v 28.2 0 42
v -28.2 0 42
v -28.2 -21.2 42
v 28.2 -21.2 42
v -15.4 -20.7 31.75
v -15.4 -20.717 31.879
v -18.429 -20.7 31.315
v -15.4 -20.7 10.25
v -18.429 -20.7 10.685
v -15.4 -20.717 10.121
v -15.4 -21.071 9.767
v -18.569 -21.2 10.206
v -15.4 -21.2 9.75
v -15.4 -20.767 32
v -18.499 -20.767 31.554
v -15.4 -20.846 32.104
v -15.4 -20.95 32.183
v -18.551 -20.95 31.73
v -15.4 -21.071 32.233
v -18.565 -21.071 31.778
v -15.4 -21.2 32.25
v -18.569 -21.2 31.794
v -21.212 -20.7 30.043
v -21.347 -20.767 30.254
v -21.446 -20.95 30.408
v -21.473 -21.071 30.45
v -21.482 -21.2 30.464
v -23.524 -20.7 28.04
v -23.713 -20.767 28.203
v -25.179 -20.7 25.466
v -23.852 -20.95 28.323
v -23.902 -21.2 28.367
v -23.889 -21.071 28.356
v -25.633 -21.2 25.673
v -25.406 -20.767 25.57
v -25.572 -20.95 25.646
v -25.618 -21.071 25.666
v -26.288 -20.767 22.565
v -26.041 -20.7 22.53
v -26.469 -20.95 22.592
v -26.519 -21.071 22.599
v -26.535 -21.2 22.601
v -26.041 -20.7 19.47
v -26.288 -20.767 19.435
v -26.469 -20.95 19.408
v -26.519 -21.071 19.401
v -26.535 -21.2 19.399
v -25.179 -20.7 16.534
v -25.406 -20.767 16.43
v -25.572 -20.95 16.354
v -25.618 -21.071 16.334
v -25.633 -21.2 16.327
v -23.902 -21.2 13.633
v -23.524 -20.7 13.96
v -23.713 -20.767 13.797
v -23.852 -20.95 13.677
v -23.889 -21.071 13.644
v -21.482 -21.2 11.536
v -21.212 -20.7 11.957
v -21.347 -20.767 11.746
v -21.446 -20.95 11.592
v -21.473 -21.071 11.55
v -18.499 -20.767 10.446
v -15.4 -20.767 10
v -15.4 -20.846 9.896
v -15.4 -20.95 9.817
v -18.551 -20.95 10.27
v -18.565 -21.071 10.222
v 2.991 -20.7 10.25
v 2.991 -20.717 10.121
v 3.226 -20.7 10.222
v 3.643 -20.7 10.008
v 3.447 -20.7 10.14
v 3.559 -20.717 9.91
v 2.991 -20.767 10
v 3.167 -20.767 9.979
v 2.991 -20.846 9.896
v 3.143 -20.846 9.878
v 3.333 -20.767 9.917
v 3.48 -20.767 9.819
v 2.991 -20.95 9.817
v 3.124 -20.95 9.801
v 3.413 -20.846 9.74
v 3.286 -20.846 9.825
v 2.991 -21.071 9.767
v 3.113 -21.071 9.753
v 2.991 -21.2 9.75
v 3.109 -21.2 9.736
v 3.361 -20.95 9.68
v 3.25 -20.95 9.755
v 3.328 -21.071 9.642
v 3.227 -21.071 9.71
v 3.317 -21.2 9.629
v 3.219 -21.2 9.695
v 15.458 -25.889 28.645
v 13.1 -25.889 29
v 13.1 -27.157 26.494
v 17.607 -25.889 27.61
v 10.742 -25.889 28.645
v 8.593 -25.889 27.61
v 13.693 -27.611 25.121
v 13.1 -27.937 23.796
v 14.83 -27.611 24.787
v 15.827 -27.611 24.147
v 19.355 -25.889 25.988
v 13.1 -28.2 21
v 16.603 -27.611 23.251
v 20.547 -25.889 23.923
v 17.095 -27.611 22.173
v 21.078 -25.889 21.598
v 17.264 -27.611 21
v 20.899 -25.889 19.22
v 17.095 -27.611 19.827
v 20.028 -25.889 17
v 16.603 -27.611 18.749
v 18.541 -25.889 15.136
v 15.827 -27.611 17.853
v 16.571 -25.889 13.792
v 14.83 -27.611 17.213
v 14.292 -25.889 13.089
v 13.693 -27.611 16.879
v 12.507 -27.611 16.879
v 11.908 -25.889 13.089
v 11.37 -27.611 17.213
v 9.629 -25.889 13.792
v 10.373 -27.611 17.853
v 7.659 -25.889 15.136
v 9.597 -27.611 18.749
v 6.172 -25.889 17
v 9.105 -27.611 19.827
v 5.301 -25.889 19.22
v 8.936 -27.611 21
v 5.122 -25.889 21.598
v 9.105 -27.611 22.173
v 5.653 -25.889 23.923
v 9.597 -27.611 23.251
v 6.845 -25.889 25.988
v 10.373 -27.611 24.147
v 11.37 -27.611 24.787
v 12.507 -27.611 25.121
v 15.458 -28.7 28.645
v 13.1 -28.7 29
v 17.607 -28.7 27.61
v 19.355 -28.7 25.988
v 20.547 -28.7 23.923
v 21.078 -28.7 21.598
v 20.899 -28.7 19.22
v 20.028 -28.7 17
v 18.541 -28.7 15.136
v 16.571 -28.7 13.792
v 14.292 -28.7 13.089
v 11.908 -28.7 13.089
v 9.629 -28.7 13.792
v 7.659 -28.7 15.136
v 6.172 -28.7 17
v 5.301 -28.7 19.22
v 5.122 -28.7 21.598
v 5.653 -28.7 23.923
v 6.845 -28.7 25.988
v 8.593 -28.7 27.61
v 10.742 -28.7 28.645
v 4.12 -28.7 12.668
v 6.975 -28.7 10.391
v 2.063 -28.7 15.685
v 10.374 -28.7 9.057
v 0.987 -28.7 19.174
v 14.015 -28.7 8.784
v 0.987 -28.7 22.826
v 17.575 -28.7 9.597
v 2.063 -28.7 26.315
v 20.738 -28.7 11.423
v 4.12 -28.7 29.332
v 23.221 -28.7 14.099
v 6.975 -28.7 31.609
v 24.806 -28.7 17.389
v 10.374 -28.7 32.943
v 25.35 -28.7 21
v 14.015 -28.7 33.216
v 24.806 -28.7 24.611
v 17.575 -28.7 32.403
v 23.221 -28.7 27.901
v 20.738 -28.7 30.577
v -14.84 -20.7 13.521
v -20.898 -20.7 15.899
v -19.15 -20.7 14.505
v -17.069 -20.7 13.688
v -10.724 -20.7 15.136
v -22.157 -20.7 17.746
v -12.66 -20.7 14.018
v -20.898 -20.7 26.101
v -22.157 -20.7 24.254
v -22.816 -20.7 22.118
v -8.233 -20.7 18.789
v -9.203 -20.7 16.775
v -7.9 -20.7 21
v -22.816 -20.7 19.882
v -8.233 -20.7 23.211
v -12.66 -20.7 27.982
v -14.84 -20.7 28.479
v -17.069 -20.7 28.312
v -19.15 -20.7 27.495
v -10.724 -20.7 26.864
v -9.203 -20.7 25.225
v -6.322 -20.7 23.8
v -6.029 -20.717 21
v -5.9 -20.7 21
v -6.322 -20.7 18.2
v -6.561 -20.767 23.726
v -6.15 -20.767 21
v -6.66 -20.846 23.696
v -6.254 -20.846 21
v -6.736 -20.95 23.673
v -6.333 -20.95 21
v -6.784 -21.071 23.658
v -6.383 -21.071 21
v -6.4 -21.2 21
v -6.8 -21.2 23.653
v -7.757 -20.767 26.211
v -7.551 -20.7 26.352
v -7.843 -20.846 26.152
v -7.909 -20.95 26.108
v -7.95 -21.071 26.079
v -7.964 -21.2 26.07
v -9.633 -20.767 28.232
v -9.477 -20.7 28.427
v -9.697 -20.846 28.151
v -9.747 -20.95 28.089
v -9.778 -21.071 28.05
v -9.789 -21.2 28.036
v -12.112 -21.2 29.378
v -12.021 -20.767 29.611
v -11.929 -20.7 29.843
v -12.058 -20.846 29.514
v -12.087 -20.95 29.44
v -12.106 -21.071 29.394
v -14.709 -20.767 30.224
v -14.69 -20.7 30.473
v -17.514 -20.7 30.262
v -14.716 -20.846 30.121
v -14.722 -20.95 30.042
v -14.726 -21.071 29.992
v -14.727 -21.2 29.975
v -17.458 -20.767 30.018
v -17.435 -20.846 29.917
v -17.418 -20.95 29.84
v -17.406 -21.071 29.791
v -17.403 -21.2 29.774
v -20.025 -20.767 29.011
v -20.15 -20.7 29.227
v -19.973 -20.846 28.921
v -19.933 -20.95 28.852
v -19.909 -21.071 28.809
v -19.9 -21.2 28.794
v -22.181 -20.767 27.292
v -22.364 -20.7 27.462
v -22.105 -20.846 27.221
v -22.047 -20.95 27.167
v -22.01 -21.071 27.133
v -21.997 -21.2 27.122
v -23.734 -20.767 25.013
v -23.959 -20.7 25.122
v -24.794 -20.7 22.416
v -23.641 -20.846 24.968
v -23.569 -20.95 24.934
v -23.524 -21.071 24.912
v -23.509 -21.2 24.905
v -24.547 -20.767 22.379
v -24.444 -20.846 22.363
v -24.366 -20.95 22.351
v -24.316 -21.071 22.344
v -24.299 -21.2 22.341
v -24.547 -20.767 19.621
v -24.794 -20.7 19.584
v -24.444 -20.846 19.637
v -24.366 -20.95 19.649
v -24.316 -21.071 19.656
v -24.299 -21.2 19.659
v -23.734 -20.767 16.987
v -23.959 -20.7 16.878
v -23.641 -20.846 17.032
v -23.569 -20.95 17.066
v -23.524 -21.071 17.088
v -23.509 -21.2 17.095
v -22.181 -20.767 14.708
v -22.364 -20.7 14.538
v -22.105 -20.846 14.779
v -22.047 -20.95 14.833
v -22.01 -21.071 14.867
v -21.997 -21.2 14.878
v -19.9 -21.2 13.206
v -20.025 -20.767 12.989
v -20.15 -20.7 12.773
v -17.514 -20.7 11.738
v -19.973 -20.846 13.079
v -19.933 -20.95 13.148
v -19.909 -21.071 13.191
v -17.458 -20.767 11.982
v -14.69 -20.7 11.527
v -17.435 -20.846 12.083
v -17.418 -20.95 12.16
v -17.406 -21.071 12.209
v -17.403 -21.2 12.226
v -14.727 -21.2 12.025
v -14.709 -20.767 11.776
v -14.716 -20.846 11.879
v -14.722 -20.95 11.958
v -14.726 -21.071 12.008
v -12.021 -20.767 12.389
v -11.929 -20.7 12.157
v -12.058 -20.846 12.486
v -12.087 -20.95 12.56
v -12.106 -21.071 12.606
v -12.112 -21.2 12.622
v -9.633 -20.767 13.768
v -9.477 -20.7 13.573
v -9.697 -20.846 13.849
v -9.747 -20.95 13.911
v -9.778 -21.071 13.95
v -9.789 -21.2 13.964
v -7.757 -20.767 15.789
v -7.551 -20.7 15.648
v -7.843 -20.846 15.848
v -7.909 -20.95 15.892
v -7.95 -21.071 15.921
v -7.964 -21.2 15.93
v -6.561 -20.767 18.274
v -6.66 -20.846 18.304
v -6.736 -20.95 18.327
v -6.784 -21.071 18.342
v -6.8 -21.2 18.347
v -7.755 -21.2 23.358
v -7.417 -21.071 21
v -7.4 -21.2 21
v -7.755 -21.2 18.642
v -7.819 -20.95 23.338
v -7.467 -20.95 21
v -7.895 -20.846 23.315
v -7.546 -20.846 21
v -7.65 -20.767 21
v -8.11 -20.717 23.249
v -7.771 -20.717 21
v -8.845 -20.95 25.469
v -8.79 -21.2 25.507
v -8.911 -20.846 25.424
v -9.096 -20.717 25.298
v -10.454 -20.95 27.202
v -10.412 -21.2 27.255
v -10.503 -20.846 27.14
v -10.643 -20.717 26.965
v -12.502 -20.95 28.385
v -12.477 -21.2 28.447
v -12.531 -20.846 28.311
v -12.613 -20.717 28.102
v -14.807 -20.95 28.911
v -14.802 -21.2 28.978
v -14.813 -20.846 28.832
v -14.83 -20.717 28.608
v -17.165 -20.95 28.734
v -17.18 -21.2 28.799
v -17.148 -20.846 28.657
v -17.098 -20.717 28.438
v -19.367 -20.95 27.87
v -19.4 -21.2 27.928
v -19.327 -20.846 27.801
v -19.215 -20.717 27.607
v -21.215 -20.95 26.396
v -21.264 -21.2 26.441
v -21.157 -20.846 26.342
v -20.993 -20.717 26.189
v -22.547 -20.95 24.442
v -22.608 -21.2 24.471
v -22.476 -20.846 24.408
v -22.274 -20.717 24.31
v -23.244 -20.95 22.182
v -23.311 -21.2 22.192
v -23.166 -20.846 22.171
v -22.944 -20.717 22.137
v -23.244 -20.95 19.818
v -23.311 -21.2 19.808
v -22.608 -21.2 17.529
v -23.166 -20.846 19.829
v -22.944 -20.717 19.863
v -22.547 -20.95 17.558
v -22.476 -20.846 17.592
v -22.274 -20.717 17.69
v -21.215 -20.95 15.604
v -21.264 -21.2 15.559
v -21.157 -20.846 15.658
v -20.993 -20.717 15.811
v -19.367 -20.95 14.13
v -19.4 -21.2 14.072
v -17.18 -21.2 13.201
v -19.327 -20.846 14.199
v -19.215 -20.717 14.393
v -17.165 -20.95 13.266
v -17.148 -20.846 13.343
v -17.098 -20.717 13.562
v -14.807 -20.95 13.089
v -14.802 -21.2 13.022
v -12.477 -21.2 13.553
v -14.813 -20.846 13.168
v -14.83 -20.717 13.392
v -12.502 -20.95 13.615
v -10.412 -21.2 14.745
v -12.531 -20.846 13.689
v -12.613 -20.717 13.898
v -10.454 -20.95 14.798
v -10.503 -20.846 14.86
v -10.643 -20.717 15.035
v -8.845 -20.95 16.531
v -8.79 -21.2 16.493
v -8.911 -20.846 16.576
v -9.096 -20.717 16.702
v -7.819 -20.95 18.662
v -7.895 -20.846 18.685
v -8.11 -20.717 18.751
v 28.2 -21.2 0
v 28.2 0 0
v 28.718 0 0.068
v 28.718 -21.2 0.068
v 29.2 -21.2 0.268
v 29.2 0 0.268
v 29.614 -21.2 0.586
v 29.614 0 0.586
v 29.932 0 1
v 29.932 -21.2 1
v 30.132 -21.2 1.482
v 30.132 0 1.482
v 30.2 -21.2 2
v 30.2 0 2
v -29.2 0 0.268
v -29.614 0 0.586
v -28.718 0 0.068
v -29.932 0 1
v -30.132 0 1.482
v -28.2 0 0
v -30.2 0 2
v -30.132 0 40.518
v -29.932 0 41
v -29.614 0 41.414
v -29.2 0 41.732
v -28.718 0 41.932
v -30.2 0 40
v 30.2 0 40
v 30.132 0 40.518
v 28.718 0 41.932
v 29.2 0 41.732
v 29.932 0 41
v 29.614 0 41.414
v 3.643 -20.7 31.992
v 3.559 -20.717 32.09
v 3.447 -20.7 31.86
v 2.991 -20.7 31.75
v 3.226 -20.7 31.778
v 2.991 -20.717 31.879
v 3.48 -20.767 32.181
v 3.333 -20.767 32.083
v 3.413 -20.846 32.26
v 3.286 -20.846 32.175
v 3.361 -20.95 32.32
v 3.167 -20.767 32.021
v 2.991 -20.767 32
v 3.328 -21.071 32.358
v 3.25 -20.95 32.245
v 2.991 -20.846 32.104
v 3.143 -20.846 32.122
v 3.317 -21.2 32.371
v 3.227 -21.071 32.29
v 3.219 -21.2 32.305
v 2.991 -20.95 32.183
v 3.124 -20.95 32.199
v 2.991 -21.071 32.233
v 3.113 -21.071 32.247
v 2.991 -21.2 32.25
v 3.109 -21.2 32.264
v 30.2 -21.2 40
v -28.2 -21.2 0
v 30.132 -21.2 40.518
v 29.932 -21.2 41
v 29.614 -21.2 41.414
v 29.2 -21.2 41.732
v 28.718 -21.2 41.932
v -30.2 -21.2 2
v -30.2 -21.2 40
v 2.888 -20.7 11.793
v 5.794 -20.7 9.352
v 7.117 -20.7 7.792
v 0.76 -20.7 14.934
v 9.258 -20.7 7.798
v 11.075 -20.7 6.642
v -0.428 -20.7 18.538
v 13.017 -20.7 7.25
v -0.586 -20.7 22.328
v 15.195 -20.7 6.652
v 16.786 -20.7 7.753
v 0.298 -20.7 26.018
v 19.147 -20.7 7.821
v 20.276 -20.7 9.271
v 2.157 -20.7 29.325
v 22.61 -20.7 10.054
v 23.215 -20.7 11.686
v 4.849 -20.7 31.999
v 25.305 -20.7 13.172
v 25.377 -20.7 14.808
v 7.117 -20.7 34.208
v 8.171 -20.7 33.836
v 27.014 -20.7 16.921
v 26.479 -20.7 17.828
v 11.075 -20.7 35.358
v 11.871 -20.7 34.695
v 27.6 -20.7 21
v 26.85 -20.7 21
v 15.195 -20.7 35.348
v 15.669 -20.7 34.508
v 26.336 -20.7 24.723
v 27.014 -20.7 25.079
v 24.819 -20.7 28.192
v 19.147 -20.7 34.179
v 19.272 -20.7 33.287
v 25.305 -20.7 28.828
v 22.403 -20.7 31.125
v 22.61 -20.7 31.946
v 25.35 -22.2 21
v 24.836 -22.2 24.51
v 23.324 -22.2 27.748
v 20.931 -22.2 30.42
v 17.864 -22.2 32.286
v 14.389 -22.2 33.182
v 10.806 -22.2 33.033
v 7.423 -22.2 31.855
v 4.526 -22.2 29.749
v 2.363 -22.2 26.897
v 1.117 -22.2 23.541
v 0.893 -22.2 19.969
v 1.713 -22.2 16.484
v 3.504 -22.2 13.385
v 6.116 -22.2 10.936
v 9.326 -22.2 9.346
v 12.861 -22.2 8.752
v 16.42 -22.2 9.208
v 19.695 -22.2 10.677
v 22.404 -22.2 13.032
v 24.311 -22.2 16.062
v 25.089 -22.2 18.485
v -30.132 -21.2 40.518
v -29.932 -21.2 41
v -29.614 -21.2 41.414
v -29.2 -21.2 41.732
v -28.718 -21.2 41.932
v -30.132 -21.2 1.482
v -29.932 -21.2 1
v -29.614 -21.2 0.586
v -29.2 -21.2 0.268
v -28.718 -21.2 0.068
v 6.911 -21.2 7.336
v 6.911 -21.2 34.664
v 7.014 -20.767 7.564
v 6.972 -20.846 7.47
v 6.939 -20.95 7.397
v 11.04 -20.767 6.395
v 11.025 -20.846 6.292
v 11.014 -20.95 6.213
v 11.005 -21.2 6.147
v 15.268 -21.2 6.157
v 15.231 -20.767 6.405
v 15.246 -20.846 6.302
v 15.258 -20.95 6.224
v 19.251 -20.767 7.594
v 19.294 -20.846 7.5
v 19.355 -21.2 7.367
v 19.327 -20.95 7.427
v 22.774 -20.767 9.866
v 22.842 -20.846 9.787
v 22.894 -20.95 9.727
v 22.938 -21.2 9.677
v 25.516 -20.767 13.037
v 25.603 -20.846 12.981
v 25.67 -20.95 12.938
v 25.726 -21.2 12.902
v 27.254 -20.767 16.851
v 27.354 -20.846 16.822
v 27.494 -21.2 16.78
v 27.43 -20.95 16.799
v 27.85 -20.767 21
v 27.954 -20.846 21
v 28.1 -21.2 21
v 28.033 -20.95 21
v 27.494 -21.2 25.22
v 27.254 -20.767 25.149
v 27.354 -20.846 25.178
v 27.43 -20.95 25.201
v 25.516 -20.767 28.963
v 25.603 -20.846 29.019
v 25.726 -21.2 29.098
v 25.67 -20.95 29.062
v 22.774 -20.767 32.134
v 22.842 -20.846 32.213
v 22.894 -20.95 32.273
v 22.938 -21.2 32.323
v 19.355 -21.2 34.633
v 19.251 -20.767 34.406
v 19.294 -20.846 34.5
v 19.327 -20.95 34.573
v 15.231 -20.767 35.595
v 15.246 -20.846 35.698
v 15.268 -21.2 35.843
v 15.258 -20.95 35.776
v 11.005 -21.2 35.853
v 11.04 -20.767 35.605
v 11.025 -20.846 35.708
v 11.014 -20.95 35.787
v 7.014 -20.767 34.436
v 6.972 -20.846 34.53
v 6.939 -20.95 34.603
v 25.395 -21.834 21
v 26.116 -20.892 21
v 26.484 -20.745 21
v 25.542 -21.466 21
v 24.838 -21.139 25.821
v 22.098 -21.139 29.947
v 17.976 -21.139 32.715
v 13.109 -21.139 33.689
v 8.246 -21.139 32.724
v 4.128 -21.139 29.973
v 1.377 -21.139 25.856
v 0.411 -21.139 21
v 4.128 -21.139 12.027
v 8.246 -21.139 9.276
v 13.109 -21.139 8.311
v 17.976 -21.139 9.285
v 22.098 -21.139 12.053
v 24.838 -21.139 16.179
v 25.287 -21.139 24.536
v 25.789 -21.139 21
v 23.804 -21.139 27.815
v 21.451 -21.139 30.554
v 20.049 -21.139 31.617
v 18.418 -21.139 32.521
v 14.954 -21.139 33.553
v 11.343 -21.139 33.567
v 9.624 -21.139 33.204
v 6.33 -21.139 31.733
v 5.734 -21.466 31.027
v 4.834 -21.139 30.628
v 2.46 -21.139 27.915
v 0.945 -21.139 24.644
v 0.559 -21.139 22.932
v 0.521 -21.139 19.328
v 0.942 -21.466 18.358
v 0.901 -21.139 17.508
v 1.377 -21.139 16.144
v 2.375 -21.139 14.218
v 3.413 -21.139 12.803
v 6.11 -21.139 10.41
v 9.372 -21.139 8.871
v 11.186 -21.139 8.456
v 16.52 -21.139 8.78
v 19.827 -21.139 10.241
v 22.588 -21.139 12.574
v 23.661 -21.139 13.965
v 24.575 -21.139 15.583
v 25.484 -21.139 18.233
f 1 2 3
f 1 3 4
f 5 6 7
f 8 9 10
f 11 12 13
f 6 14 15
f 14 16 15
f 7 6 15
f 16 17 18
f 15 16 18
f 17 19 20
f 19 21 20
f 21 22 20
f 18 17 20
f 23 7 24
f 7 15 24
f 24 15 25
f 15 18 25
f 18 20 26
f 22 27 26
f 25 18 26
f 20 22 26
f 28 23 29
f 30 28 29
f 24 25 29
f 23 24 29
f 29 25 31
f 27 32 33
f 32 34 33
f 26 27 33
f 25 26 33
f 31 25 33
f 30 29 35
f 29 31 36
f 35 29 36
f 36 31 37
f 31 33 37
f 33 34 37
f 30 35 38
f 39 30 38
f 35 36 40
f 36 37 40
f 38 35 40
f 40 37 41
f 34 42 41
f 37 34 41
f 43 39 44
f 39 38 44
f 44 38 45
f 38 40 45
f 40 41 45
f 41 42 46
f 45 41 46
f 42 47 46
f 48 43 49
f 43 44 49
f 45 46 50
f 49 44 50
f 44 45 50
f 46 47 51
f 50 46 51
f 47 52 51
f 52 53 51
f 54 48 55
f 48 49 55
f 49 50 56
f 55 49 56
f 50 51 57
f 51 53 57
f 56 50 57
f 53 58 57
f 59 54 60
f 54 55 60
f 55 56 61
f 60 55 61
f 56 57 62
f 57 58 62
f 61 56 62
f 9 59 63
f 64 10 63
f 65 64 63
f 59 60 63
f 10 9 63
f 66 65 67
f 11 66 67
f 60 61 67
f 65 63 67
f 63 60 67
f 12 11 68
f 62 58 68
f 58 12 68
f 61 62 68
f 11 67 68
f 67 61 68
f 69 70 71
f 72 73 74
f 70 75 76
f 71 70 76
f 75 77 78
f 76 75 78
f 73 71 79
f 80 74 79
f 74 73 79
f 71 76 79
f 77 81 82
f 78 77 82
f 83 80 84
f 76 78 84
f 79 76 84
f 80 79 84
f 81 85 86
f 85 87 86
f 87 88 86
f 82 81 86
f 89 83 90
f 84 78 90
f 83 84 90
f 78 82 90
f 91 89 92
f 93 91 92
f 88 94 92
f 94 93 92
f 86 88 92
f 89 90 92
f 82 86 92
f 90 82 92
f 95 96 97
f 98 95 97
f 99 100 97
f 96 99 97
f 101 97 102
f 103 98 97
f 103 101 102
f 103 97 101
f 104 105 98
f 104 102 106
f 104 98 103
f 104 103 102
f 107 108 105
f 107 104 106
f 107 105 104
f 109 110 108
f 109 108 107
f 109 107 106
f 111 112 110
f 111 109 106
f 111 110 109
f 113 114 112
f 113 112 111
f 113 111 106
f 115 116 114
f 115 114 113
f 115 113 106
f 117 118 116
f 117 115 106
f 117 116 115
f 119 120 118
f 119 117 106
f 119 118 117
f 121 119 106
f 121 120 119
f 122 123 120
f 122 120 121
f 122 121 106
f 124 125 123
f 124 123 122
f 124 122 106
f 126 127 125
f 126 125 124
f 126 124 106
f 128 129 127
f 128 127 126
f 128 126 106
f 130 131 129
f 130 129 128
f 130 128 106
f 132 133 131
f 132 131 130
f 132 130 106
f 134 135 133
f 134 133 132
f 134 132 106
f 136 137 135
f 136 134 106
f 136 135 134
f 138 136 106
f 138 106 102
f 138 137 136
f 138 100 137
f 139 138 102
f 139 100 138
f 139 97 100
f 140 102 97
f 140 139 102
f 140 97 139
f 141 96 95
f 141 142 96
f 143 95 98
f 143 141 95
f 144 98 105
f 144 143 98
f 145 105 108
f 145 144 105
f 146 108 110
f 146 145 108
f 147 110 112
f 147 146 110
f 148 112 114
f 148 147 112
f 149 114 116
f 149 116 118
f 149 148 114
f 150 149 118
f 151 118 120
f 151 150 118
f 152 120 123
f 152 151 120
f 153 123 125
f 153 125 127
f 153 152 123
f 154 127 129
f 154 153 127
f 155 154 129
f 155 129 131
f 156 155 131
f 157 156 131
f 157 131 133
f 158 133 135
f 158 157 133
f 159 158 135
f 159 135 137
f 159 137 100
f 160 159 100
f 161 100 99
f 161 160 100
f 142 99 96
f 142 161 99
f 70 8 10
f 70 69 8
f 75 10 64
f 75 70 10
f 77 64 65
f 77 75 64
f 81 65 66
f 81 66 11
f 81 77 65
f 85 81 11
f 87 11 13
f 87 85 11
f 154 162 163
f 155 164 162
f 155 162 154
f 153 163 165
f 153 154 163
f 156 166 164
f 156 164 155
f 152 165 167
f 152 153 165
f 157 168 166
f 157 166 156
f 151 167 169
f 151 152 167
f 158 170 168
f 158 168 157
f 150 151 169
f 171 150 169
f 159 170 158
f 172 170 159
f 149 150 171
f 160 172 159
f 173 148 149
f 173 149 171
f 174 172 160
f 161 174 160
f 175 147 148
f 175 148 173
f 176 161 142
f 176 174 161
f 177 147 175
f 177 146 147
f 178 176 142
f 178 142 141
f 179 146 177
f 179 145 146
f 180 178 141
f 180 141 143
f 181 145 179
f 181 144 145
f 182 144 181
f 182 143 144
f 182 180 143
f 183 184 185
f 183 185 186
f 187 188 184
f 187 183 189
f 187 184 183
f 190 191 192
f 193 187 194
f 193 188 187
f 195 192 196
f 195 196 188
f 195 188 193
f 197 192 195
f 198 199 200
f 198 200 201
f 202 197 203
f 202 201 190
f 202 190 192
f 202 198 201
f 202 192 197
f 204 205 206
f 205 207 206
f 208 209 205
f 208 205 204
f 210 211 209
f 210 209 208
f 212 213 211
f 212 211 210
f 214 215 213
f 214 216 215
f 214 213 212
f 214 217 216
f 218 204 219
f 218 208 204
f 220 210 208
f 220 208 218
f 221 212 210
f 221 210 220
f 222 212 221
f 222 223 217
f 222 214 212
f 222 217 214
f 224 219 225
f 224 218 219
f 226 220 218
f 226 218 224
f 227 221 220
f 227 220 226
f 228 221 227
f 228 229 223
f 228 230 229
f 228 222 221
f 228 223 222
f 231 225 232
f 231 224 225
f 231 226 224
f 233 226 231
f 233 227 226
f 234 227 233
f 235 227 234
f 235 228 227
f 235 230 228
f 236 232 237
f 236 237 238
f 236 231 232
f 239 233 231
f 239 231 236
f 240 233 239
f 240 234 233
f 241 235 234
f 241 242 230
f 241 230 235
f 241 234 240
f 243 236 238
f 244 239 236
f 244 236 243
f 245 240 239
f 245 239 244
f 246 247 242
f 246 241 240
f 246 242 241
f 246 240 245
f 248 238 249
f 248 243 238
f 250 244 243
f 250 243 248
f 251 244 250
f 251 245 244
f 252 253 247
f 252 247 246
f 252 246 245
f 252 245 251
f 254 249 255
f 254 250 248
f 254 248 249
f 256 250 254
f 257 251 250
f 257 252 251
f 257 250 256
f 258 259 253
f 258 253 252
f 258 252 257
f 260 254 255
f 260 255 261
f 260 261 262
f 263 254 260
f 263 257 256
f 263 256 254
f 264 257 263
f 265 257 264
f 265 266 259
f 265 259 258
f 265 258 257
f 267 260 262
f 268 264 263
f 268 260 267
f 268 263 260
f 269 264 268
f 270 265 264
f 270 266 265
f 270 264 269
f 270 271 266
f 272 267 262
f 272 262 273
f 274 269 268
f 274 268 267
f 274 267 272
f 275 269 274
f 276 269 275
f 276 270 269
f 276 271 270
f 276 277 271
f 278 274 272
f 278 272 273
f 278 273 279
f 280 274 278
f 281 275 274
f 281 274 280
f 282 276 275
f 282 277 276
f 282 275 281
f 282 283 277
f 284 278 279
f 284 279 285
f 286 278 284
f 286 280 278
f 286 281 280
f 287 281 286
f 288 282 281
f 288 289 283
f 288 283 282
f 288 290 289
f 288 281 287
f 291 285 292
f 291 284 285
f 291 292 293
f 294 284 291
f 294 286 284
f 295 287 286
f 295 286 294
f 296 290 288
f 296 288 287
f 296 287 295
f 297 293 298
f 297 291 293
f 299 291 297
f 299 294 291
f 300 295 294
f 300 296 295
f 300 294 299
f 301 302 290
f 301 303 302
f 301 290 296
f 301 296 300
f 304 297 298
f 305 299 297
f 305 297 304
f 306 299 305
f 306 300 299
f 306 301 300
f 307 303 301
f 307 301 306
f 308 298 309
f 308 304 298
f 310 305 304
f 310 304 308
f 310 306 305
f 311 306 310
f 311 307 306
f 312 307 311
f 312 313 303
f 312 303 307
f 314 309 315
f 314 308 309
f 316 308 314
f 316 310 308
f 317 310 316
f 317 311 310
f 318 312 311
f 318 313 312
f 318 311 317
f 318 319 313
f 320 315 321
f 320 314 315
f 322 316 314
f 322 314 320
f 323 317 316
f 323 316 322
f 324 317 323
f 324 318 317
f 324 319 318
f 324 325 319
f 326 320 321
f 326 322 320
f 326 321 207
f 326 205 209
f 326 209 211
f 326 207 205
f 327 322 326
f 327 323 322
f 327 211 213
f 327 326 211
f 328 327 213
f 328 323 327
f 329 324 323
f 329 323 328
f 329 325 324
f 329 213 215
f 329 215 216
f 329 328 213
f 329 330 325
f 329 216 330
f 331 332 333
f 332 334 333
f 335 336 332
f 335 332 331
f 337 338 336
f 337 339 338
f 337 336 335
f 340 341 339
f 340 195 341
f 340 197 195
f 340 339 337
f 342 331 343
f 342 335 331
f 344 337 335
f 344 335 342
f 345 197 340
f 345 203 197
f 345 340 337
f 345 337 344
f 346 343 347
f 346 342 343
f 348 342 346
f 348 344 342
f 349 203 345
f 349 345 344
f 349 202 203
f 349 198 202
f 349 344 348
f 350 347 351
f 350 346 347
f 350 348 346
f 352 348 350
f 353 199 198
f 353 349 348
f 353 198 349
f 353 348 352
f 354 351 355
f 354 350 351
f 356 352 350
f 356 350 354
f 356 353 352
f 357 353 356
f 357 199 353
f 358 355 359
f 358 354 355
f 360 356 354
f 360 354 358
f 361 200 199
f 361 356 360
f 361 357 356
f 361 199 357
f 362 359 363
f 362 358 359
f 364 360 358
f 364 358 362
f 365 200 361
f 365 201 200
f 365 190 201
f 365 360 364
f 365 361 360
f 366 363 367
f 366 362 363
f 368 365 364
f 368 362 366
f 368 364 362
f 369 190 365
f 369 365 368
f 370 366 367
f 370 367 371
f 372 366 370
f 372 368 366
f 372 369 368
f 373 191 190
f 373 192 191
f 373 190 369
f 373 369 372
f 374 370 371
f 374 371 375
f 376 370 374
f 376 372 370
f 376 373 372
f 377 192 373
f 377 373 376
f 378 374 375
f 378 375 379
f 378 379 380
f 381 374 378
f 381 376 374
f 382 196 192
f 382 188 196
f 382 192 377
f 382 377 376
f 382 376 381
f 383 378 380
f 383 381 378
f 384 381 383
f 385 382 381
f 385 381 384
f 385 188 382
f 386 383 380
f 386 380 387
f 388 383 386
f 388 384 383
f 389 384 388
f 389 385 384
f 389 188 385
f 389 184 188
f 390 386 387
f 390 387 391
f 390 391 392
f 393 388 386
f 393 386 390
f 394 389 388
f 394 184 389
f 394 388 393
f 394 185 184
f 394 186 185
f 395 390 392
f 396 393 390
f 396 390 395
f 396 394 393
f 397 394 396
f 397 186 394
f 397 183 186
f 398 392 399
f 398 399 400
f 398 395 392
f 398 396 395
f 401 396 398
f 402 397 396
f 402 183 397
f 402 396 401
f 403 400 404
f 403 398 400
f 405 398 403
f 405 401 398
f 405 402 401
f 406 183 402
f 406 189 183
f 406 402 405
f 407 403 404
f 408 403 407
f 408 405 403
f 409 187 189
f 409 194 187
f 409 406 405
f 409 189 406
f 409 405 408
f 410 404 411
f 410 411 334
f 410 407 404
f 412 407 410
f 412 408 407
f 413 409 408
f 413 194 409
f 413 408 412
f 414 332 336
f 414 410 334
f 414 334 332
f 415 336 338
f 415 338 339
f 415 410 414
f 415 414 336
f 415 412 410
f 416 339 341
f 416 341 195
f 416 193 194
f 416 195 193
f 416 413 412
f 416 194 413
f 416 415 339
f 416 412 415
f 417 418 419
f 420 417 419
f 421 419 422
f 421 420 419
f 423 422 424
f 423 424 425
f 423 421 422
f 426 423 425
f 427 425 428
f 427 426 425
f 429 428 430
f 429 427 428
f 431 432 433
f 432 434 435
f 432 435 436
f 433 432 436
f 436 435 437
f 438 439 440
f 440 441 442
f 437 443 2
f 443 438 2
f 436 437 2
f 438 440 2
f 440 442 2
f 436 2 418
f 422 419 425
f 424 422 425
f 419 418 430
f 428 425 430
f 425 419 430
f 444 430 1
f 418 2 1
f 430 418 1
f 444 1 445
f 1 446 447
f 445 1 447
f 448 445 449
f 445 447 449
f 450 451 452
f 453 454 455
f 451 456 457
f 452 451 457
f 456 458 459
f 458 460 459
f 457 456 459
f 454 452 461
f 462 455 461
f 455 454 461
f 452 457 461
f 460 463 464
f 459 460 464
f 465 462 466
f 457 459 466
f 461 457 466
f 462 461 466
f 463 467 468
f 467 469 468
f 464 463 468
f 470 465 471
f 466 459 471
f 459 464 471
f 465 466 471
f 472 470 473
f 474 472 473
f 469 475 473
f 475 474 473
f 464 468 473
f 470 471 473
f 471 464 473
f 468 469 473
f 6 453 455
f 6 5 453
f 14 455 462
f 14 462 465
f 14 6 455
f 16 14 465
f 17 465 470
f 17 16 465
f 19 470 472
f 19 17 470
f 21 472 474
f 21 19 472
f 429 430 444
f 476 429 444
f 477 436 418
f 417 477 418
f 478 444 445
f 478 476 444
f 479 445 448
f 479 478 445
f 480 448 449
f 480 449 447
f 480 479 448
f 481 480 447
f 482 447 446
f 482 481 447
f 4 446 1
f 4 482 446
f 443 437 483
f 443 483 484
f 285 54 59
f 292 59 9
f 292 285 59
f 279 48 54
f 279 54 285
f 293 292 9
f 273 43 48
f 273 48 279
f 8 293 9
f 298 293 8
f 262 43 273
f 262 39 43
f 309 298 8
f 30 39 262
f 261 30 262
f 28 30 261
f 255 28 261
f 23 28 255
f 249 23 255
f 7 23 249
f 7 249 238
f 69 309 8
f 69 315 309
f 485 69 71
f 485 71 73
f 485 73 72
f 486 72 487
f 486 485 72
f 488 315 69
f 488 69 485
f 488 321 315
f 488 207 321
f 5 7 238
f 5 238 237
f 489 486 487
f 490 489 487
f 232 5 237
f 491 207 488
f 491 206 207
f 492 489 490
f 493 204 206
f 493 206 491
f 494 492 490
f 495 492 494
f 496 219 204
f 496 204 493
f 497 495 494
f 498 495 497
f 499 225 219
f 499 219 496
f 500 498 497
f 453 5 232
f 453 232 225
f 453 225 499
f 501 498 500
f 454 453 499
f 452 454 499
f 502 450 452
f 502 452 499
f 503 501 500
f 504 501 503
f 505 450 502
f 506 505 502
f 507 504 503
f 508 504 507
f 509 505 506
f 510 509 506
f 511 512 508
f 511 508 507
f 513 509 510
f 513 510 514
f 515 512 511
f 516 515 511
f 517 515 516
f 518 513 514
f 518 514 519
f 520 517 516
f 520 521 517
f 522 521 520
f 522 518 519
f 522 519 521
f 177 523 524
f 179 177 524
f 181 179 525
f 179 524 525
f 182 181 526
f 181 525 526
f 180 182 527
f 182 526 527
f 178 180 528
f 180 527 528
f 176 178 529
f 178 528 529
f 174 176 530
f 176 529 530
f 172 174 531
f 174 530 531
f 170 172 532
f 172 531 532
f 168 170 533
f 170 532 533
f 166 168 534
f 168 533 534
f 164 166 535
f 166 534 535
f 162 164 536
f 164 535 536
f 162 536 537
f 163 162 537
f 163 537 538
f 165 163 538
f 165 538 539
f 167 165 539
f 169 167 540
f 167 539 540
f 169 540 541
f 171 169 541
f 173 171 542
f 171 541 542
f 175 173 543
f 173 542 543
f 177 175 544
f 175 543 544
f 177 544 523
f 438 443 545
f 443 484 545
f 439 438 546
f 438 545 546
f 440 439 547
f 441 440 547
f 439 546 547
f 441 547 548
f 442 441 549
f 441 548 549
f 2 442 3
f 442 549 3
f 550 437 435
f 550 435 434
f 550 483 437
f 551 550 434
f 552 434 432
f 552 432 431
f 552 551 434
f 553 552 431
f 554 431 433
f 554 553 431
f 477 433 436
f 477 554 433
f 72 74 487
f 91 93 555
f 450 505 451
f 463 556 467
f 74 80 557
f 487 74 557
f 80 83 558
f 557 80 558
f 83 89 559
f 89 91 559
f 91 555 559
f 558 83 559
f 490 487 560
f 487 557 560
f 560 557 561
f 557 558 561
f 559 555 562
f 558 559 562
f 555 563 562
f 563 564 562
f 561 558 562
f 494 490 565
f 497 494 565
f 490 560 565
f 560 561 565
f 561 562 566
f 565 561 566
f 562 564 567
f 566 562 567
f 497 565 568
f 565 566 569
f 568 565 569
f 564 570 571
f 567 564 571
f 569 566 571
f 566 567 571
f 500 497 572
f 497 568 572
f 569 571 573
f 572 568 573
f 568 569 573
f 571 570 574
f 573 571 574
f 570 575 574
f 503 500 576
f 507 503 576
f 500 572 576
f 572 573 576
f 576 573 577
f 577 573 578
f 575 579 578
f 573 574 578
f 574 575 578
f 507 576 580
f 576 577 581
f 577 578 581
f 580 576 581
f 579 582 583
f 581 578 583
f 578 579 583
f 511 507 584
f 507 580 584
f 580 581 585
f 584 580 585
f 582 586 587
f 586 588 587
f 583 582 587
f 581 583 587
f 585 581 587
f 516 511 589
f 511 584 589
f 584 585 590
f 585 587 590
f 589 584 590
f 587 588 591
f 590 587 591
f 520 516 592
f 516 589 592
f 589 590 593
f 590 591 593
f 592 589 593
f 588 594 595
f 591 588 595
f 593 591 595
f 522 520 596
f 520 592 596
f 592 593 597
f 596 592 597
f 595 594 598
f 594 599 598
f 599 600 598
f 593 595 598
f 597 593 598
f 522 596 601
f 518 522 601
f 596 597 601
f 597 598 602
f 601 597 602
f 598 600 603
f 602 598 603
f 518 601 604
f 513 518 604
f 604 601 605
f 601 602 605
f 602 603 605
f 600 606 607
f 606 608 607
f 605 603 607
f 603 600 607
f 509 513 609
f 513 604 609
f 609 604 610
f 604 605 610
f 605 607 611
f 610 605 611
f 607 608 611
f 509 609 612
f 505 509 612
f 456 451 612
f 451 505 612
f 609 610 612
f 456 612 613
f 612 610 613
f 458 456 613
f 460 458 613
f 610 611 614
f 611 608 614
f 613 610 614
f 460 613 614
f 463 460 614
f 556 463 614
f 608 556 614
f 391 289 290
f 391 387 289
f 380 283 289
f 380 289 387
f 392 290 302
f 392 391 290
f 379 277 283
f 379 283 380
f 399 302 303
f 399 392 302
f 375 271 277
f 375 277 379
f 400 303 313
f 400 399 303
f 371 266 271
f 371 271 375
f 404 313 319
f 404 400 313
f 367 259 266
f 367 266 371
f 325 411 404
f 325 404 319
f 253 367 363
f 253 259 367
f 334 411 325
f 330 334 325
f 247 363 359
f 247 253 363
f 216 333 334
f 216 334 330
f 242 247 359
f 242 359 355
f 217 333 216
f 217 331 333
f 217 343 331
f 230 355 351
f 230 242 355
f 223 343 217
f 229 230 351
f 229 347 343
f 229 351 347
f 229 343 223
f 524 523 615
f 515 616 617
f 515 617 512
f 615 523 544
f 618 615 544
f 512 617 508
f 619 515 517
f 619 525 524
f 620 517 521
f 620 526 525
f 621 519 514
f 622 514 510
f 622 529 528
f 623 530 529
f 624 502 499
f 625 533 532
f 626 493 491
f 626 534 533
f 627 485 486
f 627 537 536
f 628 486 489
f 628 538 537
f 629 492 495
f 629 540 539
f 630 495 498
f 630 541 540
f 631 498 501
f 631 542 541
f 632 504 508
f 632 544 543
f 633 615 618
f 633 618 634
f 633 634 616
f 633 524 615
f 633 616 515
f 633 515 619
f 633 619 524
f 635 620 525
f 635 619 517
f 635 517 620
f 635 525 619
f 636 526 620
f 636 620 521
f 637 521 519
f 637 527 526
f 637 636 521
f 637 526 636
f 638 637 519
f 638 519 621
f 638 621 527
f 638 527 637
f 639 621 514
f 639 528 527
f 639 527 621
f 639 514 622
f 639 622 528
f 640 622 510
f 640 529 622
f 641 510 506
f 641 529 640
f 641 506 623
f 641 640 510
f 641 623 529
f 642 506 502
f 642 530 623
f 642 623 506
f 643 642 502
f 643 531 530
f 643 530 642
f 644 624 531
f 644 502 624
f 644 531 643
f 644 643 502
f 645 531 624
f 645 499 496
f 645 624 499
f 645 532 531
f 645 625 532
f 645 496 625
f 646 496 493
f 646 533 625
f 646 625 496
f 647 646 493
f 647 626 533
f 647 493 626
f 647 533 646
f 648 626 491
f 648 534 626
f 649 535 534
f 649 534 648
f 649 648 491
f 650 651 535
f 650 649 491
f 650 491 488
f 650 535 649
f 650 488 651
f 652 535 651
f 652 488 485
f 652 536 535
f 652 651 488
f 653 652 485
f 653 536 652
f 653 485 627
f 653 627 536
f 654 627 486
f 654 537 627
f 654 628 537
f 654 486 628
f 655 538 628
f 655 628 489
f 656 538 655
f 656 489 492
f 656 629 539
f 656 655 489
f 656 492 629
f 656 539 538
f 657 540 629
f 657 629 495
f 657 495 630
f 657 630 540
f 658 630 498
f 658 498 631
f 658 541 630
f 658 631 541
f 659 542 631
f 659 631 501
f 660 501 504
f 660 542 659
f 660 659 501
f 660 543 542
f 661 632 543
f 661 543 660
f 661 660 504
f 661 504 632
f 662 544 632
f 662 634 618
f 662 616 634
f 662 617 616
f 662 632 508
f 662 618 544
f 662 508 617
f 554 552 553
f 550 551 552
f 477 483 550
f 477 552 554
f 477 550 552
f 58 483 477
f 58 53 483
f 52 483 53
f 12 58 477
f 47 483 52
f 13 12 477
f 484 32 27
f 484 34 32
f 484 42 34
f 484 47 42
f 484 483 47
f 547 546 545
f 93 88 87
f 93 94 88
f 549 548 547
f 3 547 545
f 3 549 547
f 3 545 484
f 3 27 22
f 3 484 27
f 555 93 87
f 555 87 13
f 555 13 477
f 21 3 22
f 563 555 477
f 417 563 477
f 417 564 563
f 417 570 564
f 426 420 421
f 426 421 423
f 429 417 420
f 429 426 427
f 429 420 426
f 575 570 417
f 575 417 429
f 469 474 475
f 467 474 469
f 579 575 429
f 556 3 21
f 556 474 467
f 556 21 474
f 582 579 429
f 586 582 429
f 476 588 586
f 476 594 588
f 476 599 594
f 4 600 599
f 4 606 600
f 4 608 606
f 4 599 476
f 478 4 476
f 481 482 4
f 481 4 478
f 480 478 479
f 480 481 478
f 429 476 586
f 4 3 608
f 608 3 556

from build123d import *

# Parameters (mm, degrees)
F0_W     = 60.4
F0_H     = 42
F1_DEPTH = 21.2
F2_R     = 2
F3_R     = 9
F3_R_2   = 12.25
F4_DEPTH = 0.5
F3_R_3   = 8
F5_DEPTH = 0.5
F6_DEPTH = 7.5
F10_R    = 1.5
F11_R    = 0.49999
F12_R    = 0.49999


# Not quite as in the source:
# - a fillet or chamfer is up to 0.001 mm smaller than in the source, because OpenCascade refuses the exact size


with BuildPart() as f1:
    # F0 (on Front) → F1 (new body)
    with BuildSketch(Plane.XZ):
        with Locations((0, 21)):
            Rectangle(F0_W, F0_H)
    extrude(amount=F1_DEPTH)

    # F2
    f2_edges = [f1.edges().sort_by_distance(p)[0] for p in [
        (-30.2, -10.6, 42),
        (30.2, -10.6, 42),
        (30.2, -10.6, 0),
        (-30.2, -10.6, 0),
    ]]
    fillet(f2_edges, radius=F2_R)

    # F3 (on face) → F4 (cut)
    with BuildSketch(Plane.XZ.offset(21.2)):
        with BuildLine():
            ThreePointArc((2.9912166904, 9.75), (3.1651187763, 9.7187836009), (3.3173064746, 9.6290322581))
            ThreePointArc((3.3173064746, 9.6290322581), (28.1, 21), (3.3173064746, 32.3709677419))
            ThreePointArc((3.3173064746, 32.3709677419), (3.1651187763, 32.2812163991), (2.9912166904, 32.25))
            Line((2.9912166904, 32.25), (-15.4, 32.25))
            ThreePointArc((-15.4, 32.25), (-26.65, 21), (-15.4, 9.75))
            Line((-15.4, 9.75), (2.9912166904, 9.75))
        make_face()
        with Locations((-15.4, 21)):
            Circle(F3_R, mode=Mode.SUBTRACT)
        with Locations((13.1, 21)):
            Circle(F3_R_2, mode=Mode.SUBTRACT)
    extrude(amount=-F4_DEPTH, mode=Mode.SUBTRACT)

    # F3 (on face) → F5 (cut)
    with BuildSketch(Plane.XZ.offset(21.2)):
        with Locations((-15.4, 21)):
            Circle(F3_R_3)
    extrude(amount=-F5_DEPTH, mode=Mode.SUBTRACT)

    # F3 (on face) → F6 (join)
    with BuildSketch(Plane.XZ.offset(21.2)):
        with Locations((13.1, 21)):
            Circle(F3_R_2)
    extrude(amount=F6_DEPTH)

    # F8 (on offset) → F9 (revolve, cut)
    with BuildSketch(Plane.YZ.offset(13.1)):
        with BuildLine():
            ThreePointArc((-28.2, 21), (-27.6105631935, 25.1636124275), (-25.8885775404, 29))
            Line((-25.8885775404, 29), (-28.7, 29))
            Line((-28.7, 29), (-28.7, 21))
            Line((-28.7, 21), (-28.2, 21))
        make_face()
    revolve(axis=Axis((13.1, -14.35, 21), (0, 1, 0)), mode=Mode.SUBTRACT)

    # F10
    f10_edges = [f1.edges().sort_by_distance(p)[0] for p in [
        (0.85, -20.7, 21),
    ]]
    fillet(f10_edges, radius=F10_R)

    # F11 (radius 0.5 in the source; OpenCascade refuses exactly that, so slightly less here)
    f11_edges = [f1.edges().sort_by_distance(p)[0] for p in [
        (-0.65, -20.7, 21),
        (-6.204392, -20.7, 9.75),
        (3.165119, -20.7, 9.718784),
        (28.1, -20.7, 21),
        (3.165119, -20.7, 32.281216),
        (-6.204392, -20.7, 32.25),
        (-26.65, -20.7, 21),
        (-24.4, -20.7, 21),
    ]]
    fillet(f11_edges, radius=F11_R)

    # F12 (radius 0.5 in the source; OpenCascade refuses exactly that, so slightly less here)
    f12_edges = [f1.edges().sort_by_distance(p)[0] for p in [
        (-23.4, -20.7, 21),
    ]]
    fillet(f12_edges, radius=F12_R)


solid = f1.part
